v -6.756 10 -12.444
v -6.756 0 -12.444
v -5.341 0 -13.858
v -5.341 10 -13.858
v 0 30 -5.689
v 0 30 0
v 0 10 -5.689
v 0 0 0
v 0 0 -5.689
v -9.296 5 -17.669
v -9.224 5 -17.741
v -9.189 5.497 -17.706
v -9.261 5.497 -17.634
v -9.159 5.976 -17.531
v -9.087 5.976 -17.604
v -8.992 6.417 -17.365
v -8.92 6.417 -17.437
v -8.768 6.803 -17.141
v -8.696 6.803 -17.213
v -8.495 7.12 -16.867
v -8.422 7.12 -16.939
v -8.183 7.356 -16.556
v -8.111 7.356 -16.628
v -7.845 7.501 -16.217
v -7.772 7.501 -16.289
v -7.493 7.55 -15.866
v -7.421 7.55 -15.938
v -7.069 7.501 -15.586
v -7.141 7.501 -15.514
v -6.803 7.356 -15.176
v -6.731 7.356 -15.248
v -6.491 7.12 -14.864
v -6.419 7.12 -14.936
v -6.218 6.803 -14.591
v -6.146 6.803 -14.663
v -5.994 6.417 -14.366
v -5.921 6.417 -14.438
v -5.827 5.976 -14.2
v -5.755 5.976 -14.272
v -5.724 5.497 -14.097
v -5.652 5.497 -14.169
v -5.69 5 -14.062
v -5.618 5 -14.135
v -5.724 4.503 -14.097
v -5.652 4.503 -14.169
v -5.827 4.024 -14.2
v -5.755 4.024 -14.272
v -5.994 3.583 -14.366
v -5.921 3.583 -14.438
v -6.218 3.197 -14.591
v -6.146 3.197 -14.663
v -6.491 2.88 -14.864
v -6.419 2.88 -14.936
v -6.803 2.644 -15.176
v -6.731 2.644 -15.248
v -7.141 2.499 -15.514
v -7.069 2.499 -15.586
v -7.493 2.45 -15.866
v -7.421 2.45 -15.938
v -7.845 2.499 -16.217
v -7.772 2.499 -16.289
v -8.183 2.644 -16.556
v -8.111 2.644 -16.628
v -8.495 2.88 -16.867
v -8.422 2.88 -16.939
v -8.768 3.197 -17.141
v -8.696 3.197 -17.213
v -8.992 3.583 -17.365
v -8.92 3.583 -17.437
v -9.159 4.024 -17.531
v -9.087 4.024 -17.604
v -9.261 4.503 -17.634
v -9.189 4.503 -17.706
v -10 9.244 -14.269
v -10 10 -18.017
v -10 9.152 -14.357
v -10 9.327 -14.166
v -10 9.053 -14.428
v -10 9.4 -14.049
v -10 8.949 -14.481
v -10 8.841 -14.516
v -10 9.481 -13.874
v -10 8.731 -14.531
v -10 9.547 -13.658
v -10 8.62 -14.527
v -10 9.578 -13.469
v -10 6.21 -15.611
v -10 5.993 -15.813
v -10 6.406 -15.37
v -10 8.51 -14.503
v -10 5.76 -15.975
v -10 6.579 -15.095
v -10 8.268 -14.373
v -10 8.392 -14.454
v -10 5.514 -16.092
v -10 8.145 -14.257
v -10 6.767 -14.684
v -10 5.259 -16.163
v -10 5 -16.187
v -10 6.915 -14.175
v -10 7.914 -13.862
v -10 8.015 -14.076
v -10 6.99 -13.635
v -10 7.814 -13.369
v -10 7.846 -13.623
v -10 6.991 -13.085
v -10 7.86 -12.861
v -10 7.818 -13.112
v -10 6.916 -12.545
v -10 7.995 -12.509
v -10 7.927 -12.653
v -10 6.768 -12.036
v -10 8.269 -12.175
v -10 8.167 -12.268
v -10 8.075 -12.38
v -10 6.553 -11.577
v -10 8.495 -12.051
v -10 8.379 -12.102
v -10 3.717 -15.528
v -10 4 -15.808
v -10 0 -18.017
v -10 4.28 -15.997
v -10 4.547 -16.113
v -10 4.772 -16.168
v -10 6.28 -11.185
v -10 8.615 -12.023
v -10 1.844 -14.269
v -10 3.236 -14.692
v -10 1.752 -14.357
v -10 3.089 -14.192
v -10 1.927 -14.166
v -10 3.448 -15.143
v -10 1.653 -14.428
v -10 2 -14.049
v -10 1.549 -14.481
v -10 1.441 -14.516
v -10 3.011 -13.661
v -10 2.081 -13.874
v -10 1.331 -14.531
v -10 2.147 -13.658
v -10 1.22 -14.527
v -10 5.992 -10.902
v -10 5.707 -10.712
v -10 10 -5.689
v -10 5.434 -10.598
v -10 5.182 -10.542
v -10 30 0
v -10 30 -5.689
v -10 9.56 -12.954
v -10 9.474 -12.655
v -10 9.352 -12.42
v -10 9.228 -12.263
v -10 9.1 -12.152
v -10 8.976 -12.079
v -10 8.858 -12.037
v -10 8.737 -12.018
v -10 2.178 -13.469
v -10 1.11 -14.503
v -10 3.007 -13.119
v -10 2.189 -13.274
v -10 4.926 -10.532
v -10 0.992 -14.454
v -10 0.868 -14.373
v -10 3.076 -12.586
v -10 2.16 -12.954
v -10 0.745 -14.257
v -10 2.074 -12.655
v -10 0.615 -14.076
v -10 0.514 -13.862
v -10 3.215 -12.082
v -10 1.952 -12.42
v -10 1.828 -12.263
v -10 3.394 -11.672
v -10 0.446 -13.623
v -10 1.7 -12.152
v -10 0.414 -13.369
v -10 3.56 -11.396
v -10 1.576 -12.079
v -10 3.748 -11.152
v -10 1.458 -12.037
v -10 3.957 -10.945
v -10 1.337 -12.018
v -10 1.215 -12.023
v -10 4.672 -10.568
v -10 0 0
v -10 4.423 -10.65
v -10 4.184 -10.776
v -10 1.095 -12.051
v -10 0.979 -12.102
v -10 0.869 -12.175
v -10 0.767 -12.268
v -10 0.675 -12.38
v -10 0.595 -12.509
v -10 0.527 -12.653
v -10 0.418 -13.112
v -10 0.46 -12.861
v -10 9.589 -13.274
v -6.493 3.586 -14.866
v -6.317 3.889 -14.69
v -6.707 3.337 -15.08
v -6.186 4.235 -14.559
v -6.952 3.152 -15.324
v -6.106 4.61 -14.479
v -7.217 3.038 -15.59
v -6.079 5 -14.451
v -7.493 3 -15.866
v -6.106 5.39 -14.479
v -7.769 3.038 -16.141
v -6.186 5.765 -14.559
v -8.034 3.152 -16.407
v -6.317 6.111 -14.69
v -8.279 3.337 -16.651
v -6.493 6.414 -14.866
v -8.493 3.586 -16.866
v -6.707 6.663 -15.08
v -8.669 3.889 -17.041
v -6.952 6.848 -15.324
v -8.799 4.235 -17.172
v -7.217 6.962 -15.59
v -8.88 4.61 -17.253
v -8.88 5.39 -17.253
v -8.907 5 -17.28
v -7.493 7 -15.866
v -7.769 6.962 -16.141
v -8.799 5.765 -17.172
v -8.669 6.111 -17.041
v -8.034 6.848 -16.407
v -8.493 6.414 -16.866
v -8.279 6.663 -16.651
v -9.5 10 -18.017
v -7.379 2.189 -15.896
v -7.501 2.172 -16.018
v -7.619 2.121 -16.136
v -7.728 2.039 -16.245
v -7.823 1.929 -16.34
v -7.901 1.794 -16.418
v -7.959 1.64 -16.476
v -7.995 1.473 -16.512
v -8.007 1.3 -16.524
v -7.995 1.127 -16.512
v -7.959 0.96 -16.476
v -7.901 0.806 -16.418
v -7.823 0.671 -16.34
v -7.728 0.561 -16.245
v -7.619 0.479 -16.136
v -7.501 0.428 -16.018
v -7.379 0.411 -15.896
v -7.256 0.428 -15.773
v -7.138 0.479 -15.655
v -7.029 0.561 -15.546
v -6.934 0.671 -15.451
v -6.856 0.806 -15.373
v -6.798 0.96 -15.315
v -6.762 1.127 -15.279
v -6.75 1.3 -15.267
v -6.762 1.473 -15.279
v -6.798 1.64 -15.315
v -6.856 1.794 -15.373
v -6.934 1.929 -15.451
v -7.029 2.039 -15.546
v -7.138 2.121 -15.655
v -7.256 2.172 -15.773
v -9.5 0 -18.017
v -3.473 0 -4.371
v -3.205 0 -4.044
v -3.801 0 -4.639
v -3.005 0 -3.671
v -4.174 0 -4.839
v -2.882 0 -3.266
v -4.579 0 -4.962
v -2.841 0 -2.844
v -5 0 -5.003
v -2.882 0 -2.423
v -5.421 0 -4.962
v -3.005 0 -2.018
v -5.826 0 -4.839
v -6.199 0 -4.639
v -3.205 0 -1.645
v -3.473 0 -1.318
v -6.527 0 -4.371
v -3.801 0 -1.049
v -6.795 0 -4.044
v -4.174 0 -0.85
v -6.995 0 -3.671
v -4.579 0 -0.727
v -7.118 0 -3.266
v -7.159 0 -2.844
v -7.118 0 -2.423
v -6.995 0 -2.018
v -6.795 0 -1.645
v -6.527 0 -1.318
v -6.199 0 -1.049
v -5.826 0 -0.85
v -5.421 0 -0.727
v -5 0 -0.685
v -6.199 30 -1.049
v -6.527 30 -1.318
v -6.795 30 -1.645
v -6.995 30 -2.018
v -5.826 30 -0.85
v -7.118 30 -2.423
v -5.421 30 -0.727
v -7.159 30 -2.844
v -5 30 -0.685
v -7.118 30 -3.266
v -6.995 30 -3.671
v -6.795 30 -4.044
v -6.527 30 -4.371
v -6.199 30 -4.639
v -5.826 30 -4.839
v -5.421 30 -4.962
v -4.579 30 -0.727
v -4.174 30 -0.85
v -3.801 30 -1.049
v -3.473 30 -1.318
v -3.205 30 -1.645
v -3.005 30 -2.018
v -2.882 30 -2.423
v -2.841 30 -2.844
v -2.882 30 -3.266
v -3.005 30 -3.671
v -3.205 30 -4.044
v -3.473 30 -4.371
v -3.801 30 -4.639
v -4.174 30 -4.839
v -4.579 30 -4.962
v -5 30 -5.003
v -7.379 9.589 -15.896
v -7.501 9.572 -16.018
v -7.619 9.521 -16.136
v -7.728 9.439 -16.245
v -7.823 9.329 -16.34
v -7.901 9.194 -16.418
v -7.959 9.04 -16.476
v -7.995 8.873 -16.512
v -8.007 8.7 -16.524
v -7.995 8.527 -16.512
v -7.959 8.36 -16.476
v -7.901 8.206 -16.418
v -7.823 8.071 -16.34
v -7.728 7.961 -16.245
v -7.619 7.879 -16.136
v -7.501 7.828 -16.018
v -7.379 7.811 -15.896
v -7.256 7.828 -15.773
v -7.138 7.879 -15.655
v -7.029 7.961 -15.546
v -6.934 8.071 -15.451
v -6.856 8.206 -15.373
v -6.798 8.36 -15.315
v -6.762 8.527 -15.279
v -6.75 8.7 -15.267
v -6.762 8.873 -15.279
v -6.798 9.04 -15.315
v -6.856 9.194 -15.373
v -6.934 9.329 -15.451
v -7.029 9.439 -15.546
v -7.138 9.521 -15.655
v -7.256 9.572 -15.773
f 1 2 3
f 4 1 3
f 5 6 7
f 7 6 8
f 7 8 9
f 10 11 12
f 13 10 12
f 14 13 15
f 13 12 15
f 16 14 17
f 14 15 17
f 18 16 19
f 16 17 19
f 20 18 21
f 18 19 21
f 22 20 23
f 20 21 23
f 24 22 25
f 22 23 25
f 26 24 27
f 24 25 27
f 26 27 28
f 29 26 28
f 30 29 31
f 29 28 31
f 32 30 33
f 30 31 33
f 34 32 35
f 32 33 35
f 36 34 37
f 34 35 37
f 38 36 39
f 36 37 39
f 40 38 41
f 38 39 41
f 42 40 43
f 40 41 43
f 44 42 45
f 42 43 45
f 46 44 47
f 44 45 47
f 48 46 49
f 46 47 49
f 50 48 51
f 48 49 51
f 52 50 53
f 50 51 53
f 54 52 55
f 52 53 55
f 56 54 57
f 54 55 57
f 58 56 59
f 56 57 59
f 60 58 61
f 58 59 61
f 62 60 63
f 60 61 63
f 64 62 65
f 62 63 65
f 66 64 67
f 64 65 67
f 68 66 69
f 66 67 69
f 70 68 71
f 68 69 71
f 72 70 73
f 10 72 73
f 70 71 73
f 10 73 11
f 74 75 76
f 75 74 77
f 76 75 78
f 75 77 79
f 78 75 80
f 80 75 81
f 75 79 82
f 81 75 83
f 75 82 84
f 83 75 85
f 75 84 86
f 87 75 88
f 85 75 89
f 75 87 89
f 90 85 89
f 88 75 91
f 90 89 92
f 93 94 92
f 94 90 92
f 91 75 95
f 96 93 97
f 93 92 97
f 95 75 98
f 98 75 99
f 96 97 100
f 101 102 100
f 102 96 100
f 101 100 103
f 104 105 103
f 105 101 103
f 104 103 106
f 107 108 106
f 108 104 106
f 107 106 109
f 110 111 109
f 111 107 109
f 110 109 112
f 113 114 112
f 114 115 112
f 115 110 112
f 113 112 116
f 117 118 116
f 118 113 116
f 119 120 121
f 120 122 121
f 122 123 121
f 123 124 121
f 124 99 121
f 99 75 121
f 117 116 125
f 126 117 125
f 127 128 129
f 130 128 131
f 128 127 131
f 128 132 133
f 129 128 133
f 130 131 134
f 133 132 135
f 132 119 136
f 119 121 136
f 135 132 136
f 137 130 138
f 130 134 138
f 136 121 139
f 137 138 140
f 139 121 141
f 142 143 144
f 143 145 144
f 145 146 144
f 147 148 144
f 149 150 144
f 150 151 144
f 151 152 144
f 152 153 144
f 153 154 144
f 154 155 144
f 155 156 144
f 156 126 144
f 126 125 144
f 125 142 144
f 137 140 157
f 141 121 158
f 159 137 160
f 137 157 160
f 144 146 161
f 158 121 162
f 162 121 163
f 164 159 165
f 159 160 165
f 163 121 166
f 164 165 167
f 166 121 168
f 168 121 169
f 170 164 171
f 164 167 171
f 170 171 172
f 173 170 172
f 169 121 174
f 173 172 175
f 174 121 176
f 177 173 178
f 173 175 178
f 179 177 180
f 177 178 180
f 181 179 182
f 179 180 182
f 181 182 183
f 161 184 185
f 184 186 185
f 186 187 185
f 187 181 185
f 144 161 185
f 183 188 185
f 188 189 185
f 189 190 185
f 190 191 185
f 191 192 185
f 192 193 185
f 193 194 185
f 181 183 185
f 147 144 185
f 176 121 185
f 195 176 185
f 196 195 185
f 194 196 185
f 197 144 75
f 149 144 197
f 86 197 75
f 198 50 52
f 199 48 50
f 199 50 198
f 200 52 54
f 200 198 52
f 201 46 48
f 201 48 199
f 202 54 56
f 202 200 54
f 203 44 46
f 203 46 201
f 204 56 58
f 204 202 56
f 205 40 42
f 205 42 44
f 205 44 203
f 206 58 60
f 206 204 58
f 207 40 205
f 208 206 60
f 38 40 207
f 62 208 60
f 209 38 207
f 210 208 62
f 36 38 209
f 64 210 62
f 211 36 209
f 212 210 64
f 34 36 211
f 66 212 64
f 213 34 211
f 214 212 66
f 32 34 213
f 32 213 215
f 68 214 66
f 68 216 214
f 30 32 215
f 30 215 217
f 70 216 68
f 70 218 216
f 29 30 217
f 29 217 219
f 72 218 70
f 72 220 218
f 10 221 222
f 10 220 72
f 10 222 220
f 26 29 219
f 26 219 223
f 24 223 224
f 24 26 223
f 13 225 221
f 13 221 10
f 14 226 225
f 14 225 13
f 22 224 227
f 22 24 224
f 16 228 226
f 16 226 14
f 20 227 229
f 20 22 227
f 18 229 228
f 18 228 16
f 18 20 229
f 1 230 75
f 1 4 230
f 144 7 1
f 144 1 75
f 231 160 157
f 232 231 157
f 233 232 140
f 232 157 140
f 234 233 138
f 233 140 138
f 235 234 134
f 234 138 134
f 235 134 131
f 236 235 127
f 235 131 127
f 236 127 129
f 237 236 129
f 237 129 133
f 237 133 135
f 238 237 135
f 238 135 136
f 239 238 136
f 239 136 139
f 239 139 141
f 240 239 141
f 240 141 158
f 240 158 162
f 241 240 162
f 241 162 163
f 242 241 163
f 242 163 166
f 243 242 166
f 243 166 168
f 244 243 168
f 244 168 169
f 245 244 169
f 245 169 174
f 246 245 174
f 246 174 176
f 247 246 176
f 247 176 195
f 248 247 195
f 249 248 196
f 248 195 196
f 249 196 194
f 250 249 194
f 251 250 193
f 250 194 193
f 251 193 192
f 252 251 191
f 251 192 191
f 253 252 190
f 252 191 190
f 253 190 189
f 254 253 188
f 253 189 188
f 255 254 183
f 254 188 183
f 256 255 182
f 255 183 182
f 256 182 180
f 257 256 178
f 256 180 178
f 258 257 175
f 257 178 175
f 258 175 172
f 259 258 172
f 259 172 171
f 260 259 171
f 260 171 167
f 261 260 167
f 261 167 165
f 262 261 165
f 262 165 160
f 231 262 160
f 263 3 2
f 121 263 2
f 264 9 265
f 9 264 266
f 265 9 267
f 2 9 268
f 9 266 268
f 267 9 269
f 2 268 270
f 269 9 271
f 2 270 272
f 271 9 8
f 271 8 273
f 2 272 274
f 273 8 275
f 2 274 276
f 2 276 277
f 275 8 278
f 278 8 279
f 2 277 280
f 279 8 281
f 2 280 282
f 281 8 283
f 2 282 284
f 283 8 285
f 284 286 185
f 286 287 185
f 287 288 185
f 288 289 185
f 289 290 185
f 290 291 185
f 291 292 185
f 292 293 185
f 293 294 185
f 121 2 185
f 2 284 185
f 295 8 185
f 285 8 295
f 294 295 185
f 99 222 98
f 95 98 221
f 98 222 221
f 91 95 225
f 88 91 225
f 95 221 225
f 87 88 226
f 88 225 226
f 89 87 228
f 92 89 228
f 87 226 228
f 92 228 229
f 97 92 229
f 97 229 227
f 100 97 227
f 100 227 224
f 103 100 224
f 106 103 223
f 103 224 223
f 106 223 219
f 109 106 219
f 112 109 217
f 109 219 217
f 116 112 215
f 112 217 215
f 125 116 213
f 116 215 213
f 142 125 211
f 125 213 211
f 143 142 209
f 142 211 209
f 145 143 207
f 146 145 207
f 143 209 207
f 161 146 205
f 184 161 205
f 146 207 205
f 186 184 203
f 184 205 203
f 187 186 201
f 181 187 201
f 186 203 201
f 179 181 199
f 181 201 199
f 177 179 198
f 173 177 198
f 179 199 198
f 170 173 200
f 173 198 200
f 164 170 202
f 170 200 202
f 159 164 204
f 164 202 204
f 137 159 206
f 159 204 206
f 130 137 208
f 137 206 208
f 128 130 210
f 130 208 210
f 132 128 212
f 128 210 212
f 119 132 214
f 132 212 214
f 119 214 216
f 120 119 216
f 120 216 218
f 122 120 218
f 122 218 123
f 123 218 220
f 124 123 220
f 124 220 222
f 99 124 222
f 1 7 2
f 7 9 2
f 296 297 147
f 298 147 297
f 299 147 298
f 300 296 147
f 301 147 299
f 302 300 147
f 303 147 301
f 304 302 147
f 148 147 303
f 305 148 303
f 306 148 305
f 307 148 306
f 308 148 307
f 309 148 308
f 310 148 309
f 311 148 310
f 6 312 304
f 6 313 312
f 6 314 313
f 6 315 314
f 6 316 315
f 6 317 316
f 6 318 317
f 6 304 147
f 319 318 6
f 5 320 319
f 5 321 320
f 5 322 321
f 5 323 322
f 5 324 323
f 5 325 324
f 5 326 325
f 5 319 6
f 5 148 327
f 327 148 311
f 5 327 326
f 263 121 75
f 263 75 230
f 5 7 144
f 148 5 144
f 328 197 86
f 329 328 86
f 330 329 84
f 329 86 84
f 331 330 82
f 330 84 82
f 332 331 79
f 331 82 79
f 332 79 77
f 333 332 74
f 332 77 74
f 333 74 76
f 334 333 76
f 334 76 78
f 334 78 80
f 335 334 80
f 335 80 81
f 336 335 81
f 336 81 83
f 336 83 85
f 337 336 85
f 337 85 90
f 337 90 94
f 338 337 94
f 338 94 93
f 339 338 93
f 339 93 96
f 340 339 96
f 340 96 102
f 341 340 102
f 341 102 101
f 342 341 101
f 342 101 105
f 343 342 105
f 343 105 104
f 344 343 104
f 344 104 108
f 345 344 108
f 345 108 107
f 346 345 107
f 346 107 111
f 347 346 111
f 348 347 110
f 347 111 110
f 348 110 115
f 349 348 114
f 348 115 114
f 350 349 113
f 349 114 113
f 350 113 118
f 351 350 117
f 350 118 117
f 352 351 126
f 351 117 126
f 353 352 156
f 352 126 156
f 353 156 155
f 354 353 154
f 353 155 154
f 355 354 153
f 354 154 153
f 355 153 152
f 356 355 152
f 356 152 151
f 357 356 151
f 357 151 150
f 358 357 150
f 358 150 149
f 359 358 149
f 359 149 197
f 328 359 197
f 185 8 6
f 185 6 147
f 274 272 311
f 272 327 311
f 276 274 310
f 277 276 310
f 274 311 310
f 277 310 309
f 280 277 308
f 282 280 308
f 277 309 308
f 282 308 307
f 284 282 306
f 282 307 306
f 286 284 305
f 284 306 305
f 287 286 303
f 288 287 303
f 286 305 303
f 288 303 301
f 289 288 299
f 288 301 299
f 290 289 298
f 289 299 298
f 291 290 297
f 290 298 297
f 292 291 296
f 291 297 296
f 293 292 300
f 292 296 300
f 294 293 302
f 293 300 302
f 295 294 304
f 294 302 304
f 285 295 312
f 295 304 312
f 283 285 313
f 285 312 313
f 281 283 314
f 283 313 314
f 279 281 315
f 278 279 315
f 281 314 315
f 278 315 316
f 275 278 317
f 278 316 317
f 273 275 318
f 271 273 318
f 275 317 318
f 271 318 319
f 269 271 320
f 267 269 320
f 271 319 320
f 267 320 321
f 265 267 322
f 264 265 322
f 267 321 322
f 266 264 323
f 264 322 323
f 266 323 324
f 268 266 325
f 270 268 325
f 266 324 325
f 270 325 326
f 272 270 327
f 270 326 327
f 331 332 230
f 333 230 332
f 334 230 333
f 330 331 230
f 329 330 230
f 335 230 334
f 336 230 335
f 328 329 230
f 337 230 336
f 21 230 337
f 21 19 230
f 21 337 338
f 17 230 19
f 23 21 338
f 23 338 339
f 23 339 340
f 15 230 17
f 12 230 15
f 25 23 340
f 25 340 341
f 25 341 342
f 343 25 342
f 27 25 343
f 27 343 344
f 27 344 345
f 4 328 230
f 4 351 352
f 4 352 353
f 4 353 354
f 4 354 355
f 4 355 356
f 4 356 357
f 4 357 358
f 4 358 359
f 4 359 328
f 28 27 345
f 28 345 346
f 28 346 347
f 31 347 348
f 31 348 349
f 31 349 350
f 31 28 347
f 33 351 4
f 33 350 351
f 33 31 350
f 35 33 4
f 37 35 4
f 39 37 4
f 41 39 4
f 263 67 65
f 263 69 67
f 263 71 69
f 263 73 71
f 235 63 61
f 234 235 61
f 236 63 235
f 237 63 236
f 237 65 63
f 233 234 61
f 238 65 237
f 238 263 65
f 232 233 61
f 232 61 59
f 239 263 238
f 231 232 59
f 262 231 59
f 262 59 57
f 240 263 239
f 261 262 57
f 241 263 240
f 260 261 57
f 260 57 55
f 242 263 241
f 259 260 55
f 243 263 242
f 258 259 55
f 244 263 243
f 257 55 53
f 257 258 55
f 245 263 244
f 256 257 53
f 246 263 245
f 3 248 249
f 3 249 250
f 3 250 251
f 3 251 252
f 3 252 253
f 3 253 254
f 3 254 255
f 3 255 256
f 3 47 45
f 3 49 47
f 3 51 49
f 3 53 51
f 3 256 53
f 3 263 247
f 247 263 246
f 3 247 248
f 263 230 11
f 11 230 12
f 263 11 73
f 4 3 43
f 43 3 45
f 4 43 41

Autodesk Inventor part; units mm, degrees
ref_plane "YZ Plane" through (0, 0, 0) normal (1, 0, 0) x (0, 1, 0)
ref_plane "XZ Plane" through (0, 0, 0) normal (0, 1, 0) x (-1, 0, 0)
ref_plane "XY Plane" through (0, 0, 0) normal (0, 0, 1) x (1, 0, 0)
sketch "Sketch1" plane through (0, 0, 0) normal (0, 1, 0) x (-1, 0, 0)
  line L0 (0, -5.6886) -> (6.7556, -12.4442)
  line L1 (6.7556, -12.4442) -> (5.3414, -13.8584)
  line L2 (9.5, -18.017) -> (5.3414, -13.8584)
  line L3 (10, -18.017) -> (9.5, -18.017)
  line L4 (10, -18.017) -> (10, 0)
  line L5 (0, 0) -> (10, 0)
  line L6 (0, 0) -> (0, -5.6886)
  circle A0 centre (5, -2.8443) radius 1.339
extrude "Extrusion1" add sketch "Sketch1" along normal blind 10
sketch "Sketch2" plane through (0, 10, 0) normal (0, 1, 0) x (1, 0, 0)
  line L0 (0, 5.6886) -> (-10, 5.6886)
  line L1 (-10, 5.6886) -> (-10, 0)
  line L2 (-10, 0) -> (0, 0)
  line L3 (0, 0) -> (0, 5.6886)
extrude "Extrusion2" add sketch "Sketch2" along normal blind 20
sketch "Sketch3" plane through (0, 0, 0) normal (0, -1, 0) x (1, 0, 0)
  circle A0 centre (-5, -2.8443) radius 1.339 projected
hole "Hole1" at (-5, 0, -2.8443) direction (0, 1, 0) diameter 4.318 depth 31 tip angle 118
sketch "Sketch4" plane through (-9.5, 0, -18.017) normal (0.7071, 0, -0.7071) x (-0.7071, 0, -0.7071)
  circle A0 centre (-2.9406, 5) radius 2.55
  point P0 (-19.4575, 0)
  dimension "d11" = 5.1
extrude "Extrusion3" cut sketch "Sketch4" against normal blind 0.1
sketch "Sketch5" plane through (-7.4914, 5, -15.867) normal (0.7071, 0, -0.7071) x (-0.7071, 0, -0.7071)
  circle A0 centre (0, 0) radius 2
  point P0 (-16.5169, -5)
  dimension "d15" = 4
extrude "Extrusion4" cut sketch "Sketch5" against normal blind 10
sketch "Sketch6" plane through (-9.5, 0, -18.017) normal (0.7071, 0, -0.7071) x (-0.7071, 0, -0.7071)
  circle A0 centre (-2.9406, 5) radius 2.55 projected
  line L0 (-5.8811, 0) -> (0, 0) projected
  line L1 (0, 0) -> (0, 10) projected
  line L2 (-5.8811, 10) -> (0, 10) projected
  line L3 (-5.8811, 0) -> (-5.8811, 10) projected
  point P0 (-19.4575, 0)
hole "Hole2" at (-7.3787, 1.3, -15.8957) direction (-0.7071, 0, 0.7071) diameter 1.778 depth 8 tip angle 118 clearance for "Flat Head Machine Screw (82)" size "#0" standard "Ansi Unified Screw Threads"
hole "Hole3" at (-7.3787, 8.7, -15.8957) direction (-0.7071, 0, 0.7071) diameter 1.778 depth 8 tip angle 118 clearance for "Flat Head Machine Screw (82)" size "#0" standard "Ansi Unified Screw Threads"
properties part number "recessedCoverslip_v1"
